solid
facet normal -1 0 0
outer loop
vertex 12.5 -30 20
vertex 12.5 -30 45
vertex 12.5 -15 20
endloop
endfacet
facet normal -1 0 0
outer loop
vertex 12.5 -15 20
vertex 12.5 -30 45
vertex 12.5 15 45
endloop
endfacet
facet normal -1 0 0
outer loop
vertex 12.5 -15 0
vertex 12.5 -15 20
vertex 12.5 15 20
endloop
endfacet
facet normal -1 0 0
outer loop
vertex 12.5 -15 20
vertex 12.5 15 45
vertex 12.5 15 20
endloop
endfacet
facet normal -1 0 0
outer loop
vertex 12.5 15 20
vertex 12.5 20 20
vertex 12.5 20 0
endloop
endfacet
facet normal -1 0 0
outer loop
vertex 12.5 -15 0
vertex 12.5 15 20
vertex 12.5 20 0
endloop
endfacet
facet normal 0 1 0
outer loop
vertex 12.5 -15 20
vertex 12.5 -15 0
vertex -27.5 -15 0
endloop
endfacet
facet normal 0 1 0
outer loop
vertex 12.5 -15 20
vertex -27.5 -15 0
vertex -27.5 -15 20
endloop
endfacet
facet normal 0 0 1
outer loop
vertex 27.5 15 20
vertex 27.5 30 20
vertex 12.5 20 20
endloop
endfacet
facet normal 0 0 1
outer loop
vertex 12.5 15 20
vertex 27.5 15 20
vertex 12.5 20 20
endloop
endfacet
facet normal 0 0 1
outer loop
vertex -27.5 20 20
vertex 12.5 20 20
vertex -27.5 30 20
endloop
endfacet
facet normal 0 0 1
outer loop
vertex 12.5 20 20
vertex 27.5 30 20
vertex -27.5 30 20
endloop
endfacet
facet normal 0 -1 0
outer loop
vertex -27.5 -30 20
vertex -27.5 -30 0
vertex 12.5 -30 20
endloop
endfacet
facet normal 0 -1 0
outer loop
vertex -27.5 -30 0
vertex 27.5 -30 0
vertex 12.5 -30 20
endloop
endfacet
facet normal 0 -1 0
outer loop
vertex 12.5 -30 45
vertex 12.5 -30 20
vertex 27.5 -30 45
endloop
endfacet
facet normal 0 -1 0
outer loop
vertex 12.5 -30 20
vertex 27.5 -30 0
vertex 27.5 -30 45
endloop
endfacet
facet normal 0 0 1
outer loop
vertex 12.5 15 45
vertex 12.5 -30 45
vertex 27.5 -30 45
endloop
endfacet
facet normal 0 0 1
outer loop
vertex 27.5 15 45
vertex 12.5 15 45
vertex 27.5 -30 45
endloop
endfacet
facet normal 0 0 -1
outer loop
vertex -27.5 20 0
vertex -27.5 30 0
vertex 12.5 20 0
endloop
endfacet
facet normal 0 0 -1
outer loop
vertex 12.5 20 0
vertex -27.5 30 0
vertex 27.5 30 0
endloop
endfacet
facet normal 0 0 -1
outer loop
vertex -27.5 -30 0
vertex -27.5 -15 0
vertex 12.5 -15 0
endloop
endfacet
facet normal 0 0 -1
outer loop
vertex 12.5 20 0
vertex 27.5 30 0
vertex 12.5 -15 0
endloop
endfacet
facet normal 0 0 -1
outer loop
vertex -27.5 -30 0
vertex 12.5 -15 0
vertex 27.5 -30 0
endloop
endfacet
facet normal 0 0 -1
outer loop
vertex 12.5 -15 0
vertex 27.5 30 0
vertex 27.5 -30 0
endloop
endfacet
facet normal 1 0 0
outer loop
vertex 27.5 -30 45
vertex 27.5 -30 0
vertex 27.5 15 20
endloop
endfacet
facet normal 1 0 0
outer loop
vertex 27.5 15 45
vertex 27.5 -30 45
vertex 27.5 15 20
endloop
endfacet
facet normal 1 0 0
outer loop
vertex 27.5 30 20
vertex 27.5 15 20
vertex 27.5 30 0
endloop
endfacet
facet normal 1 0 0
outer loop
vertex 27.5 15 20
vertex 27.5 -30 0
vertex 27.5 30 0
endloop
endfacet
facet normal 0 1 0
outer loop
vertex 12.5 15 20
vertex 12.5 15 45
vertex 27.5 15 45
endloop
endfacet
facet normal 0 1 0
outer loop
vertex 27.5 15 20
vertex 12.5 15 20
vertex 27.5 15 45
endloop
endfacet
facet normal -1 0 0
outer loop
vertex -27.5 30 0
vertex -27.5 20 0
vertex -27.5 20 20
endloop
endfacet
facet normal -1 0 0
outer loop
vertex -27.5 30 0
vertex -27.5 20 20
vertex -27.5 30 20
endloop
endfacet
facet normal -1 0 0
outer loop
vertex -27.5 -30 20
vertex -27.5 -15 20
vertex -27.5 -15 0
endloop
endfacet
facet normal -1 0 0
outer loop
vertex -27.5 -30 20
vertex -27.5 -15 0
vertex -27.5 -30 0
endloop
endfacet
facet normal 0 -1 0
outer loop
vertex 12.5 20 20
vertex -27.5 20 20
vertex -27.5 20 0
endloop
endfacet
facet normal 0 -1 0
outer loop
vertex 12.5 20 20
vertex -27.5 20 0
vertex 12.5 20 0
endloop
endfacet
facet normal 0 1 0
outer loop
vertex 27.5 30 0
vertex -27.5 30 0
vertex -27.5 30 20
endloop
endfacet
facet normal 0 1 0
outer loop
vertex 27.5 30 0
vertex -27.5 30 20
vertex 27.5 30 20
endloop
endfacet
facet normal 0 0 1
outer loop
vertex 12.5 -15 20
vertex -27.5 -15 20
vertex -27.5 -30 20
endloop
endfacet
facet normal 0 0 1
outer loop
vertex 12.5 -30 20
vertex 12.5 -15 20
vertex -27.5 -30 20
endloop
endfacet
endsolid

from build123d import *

# Parameters (mm, degrees)
F0_W     = 55
F0_H     = 60
F1_DEPTH = 45
F2_W     = 55
F2_H     = 25
F3_DEPTH = 15
F4_W     = 40
F4_H     = 5
F5_DEPTH = 20.001
F7_DEPTH = 45.001
F8_W     = 15
F8_H     = 20
F9_DEPTH = 40


with BuildPart() as f1:
    # F0 (on Top) → F1 (new body)
    with BuildSketch(Plane.XY):
        Rectangle(F0_W, F0_H)
    extrude(amount=F1_DEPTH)

    # F2 (on face) → F3 (cut)
    with BuildSketch(Plane(origin=(0, 30, 0), x_dir=(-1, 0, 0), z_dir=(0, 1, 0))):
        with Locations((0, 32.5)):
            Rectangle(F2_W, F2_H)
    extrude(amount=-F3_DEPTH, mode=Mode.SUBTRACT)

    # F4 (on face) → F5 (cut, through all)
    with BuildSketch(Plane.XY.offset(20)):
        with Locations((-7.5, 17.5)):
            Rectangle(F4_W, F4_H)
    extrude(amount=-F5_DEPTH, mode=Mode.SUBTRACT)

    # F6 (on face) → F7 (cut, through all)
    with BuildSketch(Plane(origin=(0, 15, 0), x_dir=(-1, 0, 0), z_dir=(0, 1, 0))):
        Polygon((-12.5, 45), (-12.5, 20), (-12.5, 0), (27.5, 0), (27.5, 45), align=None)
    extrude(amount=-F7_DEPTH, mode=Mode.SUBTRACT)

    # F8 (on face) → F9 (join)
    with BuildSketch(Plane(origin=(12.5, 0, 0), x_dir=(0, -1, 0), z_dir=(-1, 0, 0))):
        with Locations((22.5, 10)):
            Rectangle(F8_W, F8_H)
    extrude(amount=F9_DEPTH)


solid = f1.part
